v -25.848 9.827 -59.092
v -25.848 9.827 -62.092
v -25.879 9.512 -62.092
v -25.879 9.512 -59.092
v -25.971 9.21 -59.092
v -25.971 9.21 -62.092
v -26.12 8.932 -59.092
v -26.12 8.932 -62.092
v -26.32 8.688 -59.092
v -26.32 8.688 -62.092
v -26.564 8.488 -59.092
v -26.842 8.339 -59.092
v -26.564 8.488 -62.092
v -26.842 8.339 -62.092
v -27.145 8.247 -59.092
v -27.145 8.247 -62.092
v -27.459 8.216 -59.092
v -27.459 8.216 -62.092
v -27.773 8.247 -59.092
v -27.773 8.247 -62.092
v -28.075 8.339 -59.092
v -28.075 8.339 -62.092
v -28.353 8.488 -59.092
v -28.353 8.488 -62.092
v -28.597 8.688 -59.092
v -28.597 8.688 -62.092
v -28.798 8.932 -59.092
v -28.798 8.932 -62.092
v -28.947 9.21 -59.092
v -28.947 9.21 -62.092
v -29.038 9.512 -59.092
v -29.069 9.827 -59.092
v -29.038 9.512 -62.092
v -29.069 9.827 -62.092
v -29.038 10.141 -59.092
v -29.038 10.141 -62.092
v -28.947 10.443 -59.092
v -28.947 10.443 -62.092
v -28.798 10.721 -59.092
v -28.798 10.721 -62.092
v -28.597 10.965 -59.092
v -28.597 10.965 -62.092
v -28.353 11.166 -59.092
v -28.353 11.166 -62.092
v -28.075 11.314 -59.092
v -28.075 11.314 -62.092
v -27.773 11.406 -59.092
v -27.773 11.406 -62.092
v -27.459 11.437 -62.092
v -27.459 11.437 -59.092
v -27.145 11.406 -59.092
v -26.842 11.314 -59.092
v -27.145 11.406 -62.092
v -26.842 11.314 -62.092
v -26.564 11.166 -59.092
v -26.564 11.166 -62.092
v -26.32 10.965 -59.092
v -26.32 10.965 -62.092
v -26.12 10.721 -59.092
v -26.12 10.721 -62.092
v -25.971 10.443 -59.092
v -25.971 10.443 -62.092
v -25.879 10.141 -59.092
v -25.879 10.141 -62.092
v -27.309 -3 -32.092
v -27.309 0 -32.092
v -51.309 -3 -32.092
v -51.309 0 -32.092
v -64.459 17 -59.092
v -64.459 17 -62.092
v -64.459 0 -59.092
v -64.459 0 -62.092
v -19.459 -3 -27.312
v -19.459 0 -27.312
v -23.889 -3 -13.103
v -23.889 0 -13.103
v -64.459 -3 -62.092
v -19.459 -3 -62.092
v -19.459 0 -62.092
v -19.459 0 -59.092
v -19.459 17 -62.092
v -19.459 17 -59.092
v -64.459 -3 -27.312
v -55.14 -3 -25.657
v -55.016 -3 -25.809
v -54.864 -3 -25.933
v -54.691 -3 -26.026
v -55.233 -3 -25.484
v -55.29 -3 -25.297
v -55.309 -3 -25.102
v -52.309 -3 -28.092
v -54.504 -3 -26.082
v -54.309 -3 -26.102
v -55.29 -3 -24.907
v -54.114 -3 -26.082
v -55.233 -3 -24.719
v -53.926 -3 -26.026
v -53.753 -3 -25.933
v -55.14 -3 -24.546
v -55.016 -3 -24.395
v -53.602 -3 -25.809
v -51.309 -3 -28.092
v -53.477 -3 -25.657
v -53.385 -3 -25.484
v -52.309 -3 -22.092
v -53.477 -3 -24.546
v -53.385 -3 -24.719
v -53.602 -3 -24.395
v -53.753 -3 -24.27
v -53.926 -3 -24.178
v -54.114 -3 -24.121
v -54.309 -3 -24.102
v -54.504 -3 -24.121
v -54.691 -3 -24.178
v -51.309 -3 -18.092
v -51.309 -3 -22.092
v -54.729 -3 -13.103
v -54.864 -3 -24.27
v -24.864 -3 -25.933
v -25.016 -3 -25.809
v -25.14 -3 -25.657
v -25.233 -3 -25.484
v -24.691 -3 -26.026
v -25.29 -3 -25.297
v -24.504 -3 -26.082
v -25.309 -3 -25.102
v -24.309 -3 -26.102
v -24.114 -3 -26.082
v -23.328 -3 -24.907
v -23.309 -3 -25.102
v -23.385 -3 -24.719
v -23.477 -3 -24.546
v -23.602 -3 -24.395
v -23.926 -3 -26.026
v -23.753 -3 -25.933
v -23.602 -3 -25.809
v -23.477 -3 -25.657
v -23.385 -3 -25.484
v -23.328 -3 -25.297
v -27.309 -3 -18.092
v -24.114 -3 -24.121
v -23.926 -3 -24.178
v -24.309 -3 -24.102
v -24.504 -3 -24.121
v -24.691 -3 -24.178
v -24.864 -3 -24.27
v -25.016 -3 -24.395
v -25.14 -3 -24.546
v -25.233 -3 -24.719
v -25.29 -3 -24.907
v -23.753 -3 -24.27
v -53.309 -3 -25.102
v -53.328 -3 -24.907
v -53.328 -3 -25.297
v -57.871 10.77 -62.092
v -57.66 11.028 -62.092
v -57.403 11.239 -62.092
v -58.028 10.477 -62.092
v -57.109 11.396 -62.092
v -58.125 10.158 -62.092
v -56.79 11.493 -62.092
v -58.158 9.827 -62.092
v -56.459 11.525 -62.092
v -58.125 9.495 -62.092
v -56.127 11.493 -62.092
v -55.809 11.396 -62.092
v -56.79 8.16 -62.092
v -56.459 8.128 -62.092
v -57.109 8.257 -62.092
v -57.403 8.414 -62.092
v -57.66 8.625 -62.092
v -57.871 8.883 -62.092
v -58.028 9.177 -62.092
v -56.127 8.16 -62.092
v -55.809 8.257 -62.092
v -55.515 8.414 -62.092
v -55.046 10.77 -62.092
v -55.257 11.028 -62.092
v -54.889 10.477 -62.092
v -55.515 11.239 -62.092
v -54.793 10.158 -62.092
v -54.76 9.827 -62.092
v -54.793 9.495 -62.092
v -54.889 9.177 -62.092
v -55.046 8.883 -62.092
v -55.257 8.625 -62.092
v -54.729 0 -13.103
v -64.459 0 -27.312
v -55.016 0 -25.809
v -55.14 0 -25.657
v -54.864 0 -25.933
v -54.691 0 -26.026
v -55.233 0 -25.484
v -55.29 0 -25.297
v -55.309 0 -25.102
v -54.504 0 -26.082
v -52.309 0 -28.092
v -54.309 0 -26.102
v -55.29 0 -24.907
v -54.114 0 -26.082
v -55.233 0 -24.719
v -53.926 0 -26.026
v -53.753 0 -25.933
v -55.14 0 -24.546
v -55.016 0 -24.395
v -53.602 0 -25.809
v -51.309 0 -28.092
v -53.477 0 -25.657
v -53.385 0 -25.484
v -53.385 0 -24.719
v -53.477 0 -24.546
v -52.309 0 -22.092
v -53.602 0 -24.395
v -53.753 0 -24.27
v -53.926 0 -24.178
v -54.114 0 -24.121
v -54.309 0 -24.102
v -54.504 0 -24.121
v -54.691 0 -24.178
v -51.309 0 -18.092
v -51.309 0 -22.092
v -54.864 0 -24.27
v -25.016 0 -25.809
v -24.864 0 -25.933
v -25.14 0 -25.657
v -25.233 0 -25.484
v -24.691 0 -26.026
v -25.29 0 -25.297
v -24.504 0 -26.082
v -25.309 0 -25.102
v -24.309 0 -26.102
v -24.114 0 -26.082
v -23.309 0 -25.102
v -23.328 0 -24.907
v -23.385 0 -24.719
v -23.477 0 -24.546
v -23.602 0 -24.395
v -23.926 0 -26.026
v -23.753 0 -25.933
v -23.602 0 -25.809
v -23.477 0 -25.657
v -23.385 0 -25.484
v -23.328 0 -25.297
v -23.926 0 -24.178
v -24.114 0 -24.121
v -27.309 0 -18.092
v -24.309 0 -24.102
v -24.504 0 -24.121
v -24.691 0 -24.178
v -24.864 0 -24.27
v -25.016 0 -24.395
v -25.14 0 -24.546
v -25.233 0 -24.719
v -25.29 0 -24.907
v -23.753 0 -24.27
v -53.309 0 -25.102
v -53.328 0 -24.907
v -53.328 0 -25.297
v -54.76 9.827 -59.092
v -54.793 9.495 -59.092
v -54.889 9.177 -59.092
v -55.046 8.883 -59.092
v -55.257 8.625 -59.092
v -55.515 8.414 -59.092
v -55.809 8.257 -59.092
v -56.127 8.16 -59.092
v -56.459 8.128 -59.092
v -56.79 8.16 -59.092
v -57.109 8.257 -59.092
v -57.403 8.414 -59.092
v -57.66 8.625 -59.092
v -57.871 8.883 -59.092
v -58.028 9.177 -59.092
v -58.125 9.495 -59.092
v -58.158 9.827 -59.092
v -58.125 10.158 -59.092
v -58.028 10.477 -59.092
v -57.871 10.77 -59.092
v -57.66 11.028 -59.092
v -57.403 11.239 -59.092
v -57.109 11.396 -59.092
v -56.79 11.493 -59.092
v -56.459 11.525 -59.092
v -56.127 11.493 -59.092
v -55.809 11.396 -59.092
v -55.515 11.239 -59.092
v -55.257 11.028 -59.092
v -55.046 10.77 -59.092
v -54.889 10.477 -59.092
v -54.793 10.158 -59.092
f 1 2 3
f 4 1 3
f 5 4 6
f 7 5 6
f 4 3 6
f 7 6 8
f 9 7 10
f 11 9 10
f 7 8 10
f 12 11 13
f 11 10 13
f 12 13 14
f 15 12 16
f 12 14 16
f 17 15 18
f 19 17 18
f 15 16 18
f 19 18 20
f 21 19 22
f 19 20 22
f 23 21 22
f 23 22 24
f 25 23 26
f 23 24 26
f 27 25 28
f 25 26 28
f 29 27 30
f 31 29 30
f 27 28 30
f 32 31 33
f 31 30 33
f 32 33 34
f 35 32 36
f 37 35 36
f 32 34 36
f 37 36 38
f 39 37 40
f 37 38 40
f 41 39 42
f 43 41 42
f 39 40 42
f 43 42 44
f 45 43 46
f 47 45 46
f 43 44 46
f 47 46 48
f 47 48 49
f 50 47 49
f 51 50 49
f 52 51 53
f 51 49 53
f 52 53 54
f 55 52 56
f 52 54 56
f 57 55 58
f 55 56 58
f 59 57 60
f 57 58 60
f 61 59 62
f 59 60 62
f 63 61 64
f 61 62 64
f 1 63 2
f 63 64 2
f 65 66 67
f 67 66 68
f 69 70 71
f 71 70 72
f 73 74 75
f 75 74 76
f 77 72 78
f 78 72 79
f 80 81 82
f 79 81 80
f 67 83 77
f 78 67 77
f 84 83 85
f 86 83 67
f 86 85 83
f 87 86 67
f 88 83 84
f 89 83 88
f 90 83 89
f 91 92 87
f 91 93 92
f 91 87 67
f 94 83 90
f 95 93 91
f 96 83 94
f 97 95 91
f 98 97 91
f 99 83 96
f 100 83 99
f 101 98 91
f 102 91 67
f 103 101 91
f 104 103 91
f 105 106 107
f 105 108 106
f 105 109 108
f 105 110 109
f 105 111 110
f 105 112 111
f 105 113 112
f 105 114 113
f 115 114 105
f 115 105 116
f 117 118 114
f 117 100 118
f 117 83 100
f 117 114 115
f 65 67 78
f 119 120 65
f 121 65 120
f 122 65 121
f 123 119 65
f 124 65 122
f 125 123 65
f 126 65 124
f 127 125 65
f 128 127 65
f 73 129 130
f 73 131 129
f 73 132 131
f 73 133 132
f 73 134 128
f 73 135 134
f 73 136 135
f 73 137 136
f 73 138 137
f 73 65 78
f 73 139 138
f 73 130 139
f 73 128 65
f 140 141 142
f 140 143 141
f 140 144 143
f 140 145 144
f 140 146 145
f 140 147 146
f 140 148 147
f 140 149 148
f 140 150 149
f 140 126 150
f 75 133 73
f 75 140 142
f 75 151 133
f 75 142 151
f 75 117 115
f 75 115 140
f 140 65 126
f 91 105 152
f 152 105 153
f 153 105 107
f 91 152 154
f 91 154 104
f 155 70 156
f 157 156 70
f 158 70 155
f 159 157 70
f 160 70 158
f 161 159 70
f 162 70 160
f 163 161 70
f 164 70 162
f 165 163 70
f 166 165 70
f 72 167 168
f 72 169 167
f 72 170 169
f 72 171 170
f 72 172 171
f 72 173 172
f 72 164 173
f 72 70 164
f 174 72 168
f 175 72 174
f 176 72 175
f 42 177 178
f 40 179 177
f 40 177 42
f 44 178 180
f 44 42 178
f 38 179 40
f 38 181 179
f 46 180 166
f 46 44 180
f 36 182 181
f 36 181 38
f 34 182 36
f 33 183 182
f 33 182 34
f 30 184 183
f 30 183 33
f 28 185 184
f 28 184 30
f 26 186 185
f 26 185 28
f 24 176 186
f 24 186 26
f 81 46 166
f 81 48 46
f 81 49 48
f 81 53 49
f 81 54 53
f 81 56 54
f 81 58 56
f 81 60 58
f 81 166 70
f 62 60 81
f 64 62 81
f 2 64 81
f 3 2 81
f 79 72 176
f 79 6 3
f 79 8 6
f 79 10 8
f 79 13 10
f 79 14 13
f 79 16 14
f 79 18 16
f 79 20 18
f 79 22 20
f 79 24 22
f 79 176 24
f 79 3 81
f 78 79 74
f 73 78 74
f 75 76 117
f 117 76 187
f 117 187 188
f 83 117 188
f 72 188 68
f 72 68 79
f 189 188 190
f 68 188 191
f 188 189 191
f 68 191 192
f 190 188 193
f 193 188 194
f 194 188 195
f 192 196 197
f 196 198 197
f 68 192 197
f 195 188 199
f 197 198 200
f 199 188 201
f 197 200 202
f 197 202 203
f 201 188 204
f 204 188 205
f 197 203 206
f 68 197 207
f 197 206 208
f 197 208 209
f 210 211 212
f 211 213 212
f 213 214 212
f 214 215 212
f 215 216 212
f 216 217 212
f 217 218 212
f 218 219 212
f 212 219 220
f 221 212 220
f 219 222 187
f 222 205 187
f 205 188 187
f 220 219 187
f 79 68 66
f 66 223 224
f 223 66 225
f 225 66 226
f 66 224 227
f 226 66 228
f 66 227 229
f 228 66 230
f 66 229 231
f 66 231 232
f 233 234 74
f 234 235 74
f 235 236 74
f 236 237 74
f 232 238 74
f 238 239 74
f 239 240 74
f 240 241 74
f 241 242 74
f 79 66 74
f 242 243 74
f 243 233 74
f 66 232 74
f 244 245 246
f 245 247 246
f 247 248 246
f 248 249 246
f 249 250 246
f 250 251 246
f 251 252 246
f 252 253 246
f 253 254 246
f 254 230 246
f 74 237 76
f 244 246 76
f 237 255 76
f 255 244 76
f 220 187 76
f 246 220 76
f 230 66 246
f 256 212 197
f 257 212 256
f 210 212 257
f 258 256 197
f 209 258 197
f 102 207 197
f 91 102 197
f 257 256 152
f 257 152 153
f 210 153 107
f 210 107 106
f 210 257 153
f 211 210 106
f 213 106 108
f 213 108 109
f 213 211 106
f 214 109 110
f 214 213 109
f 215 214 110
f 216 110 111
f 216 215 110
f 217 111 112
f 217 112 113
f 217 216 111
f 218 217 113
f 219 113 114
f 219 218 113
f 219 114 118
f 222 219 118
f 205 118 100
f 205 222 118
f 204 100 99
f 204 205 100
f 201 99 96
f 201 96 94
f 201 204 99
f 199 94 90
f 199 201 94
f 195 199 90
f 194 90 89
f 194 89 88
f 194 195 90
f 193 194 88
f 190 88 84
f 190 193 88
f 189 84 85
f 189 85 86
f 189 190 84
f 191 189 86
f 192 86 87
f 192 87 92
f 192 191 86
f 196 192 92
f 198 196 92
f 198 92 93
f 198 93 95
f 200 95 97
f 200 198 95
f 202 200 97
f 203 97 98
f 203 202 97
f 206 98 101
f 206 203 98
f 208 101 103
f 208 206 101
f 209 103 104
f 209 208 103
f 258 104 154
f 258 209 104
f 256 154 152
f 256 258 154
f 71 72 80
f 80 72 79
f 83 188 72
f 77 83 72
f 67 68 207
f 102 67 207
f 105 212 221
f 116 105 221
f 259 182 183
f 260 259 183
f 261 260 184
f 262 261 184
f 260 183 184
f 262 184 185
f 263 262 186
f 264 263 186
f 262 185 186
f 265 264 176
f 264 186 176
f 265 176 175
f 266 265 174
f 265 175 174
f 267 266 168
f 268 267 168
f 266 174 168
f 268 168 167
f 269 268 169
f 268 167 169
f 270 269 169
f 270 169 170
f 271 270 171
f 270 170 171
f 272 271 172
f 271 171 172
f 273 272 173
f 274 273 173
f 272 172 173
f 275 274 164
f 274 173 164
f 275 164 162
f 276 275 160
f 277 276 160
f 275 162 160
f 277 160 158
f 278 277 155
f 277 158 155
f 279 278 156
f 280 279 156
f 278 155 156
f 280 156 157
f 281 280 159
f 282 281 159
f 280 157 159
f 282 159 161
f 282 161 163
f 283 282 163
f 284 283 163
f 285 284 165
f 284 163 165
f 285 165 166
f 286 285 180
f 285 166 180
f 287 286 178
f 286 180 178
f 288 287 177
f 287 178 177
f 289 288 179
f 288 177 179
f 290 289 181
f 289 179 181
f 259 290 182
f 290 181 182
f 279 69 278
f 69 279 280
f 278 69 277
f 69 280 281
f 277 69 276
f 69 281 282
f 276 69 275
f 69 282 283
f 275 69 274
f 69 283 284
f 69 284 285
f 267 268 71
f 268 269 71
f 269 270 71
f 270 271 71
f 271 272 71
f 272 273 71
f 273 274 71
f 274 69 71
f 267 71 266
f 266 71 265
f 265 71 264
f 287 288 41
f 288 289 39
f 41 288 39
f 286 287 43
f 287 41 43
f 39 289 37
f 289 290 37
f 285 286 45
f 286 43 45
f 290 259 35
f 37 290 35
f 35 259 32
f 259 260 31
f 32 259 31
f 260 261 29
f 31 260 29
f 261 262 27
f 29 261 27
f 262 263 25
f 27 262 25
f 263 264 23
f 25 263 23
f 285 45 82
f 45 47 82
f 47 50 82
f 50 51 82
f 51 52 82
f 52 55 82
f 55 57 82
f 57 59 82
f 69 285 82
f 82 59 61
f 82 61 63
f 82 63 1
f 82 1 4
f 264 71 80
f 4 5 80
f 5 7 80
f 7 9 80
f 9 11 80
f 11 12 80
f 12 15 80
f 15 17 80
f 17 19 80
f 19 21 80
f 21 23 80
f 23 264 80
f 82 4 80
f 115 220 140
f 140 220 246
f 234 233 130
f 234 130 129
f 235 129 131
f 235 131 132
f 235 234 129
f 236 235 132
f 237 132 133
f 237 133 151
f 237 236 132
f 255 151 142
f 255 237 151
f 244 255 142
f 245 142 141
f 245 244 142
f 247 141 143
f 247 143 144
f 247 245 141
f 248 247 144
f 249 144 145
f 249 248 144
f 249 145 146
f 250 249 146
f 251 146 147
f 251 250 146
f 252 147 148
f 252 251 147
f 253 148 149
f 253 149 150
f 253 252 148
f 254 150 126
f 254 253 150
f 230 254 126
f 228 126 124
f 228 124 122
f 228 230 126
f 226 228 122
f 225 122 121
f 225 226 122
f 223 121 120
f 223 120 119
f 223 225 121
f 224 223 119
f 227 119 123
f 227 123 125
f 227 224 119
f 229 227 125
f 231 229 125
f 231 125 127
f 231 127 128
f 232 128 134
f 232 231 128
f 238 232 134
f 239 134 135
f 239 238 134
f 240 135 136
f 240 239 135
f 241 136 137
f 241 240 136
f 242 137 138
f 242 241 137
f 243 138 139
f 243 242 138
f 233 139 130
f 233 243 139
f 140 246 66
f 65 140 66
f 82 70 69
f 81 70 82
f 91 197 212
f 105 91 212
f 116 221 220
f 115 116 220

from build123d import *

# Parameters (mm, degrees)
F0_R     = 1
F1_DEPTH = 3
F2_W     = 45
F2_H     = 17
F2_R     = 1.698824
F2_R_2   = 1.610418
F3_DEPTH = 3


with BuildPart() as f1:
    # F0 (on Front) → F1 (new body)
    with BuildSketch(Plane.XZ):
        Polygon((-64.45872, -27.312139), (-64.45872, -62.091763), (-19.45872, -62.091763), (-19.45872, -60.003541), (-19.45872, -27.312139), (-23.88858, -13.103288), (-54.728993, -13.103288), align=None)
        with Locations((-54.308786, -25.101645)):
            Circle(F0_R, mode=Mode.SUBTRACT)
        Polygon((-51.308786, -22.091763), (-51.308786, -18.091763), (-27.308786, -18.091763), (-27.308786, -32.091763), (-51.308786, -32.091763), (-51.308786, -28.091763), (-52.308786, -28.091763), (-52.308786, -22.091763), align=None, mode=Mode.SUBTRACT)
        with Locations((-24.308786, -25.101645)):
            Circle(F0_R, mode=Mode.SUBTRACT)
    extrude(amount=F1_DEPTH)


with BuildPart() as f3:
    # F2 (on face) → F3 (new body)
    with BuildSketch(Plane(origin=(0, 0, -62.091763), x_dir=(1, 0, 0), z_dir=(0, 0, -1))):
        with Locations((-41.95872, -8.5)):
            Rectangle(F2_W, F2_H)
        with Locations((-56.45872, -9.826623)):
            Circle(F2_R, mode=Mode.SUBTRACT)
        with Locations((-27.45872, -9.826623)):
            Circle(F2_R_2, mode=Mode.SUBTRACT)
    extrude(amount=-F3_DEPTH)


solid = Compound([f1.part, f3.part])
